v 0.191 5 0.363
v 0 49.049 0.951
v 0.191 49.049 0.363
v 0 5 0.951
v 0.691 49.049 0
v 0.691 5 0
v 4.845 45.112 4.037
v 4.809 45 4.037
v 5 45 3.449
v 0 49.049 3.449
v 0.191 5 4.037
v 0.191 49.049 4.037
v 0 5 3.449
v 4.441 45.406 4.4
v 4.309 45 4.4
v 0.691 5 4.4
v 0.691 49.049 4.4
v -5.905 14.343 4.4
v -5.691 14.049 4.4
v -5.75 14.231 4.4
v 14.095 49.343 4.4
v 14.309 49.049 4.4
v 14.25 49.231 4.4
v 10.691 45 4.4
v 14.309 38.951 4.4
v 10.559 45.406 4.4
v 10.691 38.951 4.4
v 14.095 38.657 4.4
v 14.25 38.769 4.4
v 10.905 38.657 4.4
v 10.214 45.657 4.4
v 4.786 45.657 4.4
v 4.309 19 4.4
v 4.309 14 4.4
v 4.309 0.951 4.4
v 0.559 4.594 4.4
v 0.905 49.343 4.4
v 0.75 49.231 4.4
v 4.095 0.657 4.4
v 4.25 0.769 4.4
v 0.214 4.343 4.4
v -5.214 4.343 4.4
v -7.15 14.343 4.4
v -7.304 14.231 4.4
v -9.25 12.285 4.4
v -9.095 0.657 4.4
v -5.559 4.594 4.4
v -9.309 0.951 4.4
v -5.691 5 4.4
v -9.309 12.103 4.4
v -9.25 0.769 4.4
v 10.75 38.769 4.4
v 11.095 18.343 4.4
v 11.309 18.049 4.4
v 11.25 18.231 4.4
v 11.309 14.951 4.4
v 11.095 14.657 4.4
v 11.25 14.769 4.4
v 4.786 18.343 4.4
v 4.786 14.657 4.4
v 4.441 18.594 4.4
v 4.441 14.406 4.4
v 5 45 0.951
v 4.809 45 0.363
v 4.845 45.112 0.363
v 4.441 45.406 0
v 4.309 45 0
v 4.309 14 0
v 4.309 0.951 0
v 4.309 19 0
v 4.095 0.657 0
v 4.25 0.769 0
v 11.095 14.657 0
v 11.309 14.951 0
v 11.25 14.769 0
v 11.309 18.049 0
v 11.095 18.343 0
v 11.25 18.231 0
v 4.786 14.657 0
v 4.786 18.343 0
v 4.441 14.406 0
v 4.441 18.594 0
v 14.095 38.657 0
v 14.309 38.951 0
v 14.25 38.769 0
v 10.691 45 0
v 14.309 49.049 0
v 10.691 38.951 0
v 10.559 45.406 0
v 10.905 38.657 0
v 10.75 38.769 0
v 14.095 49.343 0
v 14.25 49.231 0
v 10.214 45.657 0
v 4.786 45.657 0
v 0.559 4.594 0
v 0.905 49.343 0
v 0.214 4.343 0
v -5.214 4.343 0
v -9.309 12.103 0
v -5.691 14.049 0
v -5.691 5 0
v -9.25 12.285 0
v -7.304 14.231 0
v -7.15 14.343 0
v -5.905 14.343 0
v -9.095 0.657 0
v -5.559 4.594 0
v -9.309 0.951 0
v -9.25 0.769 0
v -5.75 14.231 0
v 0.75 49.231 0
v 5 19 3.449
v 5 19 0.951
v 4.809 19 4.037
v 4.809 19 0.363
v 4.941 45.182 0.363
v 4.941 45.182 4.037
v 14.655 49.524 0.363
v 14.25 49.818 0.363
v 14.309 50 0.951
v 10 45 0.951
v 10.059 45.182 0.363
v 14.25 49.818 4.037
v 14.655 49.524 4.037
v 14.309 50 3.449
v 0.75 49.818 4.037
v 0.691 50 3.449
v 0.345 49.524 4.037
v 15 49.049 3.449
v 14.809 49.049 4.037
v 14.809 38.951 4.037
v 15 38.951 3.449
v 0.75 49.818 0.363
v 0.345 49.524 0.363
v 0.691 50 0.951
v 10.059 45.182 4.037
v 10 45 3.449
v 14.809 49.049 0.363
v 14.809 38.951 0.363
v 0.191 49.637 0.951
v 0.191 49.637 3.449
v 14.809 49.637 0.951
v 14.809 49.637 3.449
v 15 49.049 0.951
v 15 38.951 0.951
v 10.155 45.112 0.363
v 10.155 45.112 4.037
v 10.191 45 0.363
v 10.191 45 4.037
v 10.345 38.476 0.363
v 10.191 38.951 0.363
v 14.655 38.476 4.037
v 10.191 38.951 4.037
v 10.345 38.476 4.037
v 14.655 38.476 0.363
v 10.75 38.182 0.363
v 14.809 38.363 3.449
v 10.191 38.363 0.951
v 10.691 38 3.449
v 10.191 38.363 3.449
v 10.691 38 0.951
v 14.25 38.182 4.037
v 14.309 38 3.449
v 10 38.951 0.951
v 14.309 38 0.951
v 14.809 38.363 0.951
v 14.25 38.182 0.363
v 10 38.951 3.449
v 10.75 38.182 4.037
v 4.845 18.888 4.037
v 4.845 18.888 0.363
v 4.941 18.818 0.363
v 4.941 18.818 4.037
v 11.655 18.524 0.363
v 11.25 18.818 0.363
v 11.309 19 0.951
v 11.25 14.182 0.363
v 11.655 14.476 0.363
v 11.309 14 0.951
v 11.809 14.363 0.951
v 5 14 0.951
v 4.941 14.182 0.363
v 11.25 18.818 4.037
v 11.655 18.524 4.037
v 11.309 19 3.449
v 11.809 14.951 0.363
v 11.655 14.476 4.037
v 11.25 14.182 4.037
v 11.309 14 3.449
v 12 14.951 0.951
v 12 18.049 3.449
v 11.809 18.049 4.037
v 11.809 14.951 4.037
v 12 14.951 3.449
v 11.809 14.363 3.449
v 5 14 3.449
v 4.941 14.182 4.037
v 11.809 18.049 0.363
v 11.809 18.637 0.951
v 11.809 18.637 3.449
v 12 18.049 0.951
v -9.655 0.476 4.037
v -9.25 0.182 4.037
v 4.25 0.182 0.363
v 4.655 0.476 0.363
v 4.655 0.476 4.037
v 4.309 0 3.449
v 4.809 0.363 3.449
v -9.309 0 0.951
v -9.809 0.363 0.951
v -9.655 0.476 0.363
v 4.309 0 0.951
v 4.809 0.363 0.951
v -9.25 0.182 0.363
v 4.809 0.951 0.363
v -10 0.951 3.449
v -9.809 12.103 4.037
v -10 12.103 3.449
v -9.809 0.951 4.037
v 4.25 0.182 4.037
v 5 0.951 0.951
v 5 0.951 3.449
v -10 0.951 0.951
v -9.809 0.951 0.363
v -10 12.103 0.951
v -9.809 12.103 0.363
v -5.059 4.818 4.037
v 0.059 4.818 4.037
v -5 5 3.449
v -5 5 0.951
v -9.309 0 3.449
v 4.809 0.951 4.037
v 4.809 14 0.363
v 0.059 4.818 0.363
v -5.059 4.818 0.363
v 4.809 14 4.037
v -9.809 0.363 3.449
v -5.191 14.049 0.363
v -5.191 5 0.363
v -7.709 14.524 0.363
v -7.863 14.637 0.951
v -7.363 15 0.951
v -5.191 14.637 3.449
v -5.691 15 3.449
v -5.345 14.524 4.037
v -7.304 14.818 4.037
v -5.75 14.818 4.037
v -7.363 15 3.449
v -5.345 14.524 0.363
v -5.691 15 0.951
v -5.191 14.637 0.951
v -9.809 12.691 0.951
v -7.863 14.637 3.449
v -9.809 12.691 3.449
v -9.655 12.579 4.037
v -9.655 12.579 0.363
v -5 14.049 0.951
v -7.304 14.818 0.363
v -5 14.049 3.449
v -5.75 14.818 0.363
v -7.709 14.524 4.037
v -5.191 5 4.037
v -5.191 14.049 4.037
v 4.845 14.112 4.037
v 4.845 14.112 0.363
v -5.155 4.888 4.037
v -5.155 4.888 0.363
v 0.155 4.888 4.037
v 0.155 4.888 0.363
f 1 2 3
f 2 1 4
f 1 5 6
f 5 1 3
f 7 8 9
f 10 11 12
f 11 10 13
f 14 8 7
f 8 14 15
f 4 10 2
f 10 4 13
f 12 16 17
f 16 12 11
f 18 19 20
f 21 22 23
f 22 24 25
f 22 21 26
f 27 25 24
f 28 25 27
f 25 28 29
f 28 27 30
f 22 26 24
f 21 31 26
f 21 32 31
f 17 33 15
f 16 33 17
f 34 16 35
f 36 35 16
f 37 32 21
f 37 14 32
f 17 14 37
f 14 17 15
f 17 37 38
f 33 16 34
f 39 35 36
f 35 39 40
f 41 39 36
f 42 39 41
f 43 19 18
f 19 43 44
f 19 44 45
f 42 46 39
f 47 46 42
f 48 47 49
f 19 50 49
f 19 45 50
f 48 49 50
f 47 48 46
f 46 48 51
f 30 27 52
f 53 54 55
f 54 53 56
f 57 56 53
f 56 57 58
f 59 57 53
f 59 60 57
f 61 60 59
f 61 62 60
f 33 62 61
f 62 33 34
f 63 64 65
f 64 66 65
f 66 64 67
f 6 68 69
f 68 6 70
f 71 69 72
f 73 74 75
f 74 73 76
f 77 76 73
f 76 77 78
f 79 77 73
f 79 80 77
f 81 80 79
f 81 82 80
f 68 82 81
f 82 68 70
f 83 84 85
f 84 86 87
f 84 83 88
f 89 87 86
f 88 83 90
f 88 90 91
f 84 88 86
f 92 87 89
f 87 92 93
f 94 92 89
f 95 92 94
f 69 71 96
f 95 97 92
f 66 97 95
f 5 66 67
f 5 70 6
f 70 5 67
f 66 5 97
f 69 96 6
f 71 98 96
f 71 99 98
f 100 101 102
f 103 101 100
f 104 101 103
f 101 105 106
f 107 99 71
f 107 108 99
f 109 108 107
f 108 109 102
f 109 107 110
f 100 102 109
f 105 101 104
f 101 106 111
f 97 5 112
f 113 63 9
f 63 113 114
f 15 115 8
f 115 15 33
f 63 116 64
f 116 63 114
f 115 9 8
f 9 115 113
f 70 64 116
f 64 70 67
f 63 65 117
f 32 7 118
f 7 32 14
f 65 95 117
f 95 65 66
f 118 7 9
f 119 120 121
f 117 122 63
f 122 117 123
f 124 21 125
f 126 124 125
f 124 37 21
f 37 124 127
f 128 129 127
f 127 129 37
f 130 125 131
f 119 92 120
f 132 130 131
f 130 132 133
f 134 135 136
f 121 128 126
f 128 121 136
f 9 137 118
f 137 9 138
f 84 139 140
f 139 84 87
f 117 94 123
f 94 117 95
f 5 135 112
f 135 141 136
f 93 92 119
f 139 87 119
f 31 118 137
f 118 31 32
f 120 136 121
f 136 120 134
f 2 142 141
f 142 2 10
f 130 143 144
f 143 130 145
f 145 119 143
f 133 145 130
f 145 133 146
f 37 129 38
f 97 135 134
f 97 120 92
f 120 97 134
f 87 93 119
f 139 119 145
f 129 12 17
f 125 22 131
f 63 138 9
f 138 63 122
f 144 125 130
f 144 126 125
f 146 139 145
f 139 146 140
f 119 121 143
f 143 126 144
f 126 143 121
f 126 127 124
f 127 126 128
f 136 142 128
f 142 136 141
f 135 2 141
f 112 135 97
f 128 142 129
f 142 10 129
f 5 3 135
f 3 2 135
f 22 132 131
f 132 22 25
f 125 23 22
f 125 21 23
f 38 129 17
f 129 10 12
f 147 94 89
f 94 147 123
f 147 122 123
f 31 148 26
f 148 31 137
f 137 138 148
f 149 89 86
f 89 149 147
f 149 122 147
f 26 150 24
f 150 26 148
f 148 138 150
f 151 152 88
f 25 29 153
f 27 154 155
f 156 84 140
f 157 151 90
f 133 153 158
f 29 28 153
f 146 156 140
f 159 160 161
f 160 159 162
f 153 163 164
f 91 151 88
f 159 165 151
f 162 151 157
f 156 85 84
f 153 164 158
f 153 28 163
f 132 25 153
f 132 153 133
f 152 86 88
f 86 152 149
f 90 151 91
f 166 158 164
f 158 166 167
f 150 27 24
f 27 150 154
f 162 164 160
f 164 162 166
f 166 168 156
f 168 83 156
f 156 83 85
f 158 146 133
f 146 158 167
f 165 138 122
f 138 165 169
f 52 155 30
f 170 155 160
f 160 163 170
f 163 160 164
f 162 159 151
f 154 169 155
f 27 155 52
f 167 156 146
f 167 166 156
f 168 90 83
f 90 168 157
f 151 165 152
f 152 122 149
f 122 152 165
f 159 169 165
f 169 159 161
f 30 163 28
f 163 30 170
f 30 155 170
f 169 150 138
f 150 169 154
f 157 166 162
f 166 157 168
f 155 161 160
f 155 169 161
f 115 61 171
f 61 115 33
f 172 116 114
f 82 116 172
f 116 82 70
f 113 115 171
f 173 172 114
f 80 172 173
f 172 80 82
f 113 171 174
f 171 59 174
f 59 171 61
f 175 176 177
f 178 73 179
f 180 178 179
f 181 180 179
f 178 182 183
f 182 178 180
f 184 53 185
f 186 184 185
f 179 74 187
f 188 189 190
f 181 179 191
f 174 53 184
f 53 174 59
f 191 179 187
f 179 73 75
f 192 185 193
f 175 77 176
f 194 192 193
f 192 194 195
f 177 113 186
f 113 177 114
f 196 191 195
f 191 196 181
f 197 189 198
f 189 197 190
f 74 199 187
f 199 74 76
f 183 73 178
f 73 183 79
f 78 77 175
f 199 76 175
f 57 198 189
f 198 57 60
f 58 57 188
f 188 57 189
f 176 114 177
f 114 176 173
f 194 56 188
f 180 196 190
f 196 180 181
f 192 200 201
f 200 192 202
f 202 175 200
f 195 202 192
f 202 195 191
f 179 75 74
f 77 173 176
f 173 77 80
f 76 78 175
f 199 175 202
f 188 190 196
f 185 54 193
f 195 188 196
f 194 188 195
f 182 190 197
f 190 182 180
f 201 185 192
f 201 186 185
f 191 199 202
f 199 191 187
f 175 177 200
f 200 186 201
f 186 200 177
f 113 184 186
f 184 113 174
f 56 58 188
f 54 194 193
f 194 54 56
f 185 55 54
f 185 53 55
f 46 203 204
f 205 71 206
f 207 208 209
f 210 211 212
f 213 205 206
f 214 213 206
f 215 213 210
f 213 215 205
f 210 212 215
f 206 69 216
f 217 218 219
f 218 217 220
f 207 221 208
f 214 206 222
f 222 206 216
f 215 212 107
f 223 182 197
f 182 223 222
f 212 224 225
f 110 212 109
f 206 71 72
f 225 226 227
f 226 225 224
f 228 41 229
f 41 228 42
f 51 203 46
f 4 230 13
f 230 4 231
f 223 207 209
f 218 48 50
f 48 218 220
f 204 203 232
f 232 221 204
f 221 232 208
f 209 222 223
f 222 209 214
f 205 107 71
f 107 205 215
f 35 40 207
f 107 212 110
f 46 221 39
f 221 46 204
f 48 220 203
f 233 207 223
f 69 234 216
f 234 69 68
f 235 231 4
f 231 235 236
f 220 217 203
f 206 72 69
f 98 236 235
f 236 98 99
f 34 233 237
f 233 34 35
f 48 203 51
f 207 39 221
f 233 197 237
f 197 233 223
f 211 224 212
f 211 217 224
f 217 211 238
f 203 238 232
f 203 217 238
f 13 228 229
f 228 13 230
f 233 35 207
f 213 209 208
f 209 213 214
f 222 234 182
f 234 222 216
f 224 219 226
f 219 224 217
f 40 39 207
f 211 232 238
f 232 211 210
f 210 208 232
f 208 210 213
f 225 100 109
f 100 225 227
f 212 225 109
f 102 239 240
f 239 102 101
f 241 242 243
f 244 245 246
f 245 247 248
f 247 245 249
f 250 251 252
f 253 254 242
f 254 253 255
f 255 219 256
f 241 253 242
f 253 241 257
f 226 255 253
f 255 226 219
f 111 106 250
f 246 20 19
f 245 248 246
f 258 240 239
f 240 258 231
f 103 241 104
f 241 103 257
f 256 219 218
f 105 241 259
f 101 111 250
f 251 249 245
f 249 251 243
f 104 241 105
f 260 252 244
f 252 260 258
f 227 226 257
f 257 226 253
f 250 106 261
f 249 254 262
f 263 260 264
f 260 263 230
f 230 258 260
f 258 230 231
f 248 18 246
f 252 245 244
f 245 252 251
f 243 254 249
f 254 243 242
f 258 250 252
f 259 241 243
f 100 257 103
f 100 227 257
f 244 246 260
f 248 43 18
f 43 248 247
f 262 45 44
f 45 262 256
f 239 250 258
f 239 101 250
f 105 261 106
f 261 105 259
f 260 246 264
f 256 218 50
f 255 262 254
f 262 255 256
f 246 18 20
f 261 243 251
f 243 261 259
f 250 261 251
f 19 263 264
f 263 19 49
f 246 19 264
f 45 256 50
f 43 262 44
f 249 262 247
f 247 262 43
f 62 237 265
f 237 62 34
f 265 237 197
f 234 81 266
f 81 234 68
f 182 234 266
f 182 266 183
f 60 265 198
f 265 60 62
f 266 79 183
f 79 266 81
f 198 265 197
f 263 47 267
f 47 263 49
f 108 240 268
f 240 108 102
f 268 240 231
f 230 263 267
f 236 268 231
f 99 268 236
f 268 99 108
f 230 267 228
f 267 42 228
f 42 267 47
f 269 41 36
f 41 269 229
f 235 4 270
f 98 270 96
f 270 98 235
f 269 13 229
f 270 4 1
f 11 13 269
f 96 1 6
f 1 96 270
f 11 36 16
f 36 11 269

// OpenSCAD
/* [Hidden] */
$fn = 10;

CLIP_HEIGHT = 12;
CLIP_PIN_INNER_DISTANCE = 26;
PIN_LENGTH = 7;

BASE_WIDTH = 4.4;
BASE_DEPTH = 5;

/* [Base] */
// Height of the base.
BASE_HEIGHT = 50; // [36:100]

/* [Hook] */
// Enable Smooth Edges.
ENABLE_SMOOTH_EDGES = true;
// Make the hook a bit prettier.
ENABLE_HOOK_NICE = true;
// Length (horizontal size) of the hook.
HOOK_SIZE_H = 15; // [1:100]
// Height (vertical size) of the hook.
HOOK_SIZE_V = 10; // [0:50]
// Vertical rotation of the hook.
HOOK_ROTATION = 0; // [0:90]


minkowskiOutsideRound(1, ENABLE_SMOOTH_EDGES) {
	hook(
		base_height = BASE_HEIGHT,
		base_width = BASE_WIDTH,
		base_depth = BASE_DEPTH,
		clip_height = CLIP_HEIGHT,
		clip_pin_distance = CLIP_PIN_INNER_DISTANCE,
		pin_length = PIN_LENGTH,
		hook_size_h = HOOK_SIZE_H,
		hook_size_v = HOOK_SIZE_V,
		hook_nice = ENABLE_HOOK_NICE,
		hook_rotation = HOOK_ROTATION
	);
}


module hook(
	base_height = 50,
	base_width = 4.4,
	base_depth = 5,
	clip_height = 12,
	clip_pin_distance = 19,
	pin_length = 7,
	hook_size_h = 15,
	hook_size_v = 5,
	hook_nice = true,
	hook_rotation = 0,
) {
	// Base
	cube(size=[base_depth, base_height, base_width]);

	// Clip, Top
	translate([base_depth, base_height-base_depth, 0]) {
		cube(size=[base_depth, base_depth, base_width]);
	}

	// Clip, Back
	translate([base_depth*2, base_height-clip_height, 0]) {
		cube(size=[base_depth, clip_height, base_width]);
	}

	// Pin
	translate([base_depth, base_height-2*base_depth-clip_pin_distance, 0]) {
		cube(size=[7, base_depth, base_width]);
	}

	// Hook, Horizontal
	translate([-(hook_size_h-base_depth), 0, 0]) {
		cube(size=[hook_size_h-base_depth, base_depth, base_width]);
	}

	// Hook, Vertical
	if (hook_size_h > 0) {
		translate([-(hook_size_h-base_depth), 0, 0]) {
			rotate([0, 0, hook_rotation]) {
				difference() {
					cube(size=[base_depth, base_depth+hook_size_v, base_width]);
					
					if (hook_nice == true) {
						translate([0, hook_size_v+base_depth/2, -1]) {
							rotate([0, 0, 45]) {
							cube(size=[base_depth, base_depth, base_width+2]);
							}
						}
					}
				}
			}
		}
	}
}

// Library: MinkowskiRound.scad
// Version: 1.0
// Author: IrevDev
// Copyright: 2017
// License: LGPL 2.1 or later
// Url: https://github.com/Irev-Dev/Round-Anything

module minkowskiOutsideRound(r=1,enable=true,cubeSize=[500,500,500]){
    if(enable==false){//do nothing if not enabled
        children();
    } else {
        minkowski(){//expand the now positive shape
            difference(){//make the negative positive
                cube(cubeSize-[0.1,0.1,0.1],center=true);
                minkowski(){//expand the negative inwards
                    difference(){//create a negative of the children
                        cube(cubeSize,center=true);
                        children();
                    }
                    sphere(r);
                }
            }
            sphere(r);
        }
    }
}
